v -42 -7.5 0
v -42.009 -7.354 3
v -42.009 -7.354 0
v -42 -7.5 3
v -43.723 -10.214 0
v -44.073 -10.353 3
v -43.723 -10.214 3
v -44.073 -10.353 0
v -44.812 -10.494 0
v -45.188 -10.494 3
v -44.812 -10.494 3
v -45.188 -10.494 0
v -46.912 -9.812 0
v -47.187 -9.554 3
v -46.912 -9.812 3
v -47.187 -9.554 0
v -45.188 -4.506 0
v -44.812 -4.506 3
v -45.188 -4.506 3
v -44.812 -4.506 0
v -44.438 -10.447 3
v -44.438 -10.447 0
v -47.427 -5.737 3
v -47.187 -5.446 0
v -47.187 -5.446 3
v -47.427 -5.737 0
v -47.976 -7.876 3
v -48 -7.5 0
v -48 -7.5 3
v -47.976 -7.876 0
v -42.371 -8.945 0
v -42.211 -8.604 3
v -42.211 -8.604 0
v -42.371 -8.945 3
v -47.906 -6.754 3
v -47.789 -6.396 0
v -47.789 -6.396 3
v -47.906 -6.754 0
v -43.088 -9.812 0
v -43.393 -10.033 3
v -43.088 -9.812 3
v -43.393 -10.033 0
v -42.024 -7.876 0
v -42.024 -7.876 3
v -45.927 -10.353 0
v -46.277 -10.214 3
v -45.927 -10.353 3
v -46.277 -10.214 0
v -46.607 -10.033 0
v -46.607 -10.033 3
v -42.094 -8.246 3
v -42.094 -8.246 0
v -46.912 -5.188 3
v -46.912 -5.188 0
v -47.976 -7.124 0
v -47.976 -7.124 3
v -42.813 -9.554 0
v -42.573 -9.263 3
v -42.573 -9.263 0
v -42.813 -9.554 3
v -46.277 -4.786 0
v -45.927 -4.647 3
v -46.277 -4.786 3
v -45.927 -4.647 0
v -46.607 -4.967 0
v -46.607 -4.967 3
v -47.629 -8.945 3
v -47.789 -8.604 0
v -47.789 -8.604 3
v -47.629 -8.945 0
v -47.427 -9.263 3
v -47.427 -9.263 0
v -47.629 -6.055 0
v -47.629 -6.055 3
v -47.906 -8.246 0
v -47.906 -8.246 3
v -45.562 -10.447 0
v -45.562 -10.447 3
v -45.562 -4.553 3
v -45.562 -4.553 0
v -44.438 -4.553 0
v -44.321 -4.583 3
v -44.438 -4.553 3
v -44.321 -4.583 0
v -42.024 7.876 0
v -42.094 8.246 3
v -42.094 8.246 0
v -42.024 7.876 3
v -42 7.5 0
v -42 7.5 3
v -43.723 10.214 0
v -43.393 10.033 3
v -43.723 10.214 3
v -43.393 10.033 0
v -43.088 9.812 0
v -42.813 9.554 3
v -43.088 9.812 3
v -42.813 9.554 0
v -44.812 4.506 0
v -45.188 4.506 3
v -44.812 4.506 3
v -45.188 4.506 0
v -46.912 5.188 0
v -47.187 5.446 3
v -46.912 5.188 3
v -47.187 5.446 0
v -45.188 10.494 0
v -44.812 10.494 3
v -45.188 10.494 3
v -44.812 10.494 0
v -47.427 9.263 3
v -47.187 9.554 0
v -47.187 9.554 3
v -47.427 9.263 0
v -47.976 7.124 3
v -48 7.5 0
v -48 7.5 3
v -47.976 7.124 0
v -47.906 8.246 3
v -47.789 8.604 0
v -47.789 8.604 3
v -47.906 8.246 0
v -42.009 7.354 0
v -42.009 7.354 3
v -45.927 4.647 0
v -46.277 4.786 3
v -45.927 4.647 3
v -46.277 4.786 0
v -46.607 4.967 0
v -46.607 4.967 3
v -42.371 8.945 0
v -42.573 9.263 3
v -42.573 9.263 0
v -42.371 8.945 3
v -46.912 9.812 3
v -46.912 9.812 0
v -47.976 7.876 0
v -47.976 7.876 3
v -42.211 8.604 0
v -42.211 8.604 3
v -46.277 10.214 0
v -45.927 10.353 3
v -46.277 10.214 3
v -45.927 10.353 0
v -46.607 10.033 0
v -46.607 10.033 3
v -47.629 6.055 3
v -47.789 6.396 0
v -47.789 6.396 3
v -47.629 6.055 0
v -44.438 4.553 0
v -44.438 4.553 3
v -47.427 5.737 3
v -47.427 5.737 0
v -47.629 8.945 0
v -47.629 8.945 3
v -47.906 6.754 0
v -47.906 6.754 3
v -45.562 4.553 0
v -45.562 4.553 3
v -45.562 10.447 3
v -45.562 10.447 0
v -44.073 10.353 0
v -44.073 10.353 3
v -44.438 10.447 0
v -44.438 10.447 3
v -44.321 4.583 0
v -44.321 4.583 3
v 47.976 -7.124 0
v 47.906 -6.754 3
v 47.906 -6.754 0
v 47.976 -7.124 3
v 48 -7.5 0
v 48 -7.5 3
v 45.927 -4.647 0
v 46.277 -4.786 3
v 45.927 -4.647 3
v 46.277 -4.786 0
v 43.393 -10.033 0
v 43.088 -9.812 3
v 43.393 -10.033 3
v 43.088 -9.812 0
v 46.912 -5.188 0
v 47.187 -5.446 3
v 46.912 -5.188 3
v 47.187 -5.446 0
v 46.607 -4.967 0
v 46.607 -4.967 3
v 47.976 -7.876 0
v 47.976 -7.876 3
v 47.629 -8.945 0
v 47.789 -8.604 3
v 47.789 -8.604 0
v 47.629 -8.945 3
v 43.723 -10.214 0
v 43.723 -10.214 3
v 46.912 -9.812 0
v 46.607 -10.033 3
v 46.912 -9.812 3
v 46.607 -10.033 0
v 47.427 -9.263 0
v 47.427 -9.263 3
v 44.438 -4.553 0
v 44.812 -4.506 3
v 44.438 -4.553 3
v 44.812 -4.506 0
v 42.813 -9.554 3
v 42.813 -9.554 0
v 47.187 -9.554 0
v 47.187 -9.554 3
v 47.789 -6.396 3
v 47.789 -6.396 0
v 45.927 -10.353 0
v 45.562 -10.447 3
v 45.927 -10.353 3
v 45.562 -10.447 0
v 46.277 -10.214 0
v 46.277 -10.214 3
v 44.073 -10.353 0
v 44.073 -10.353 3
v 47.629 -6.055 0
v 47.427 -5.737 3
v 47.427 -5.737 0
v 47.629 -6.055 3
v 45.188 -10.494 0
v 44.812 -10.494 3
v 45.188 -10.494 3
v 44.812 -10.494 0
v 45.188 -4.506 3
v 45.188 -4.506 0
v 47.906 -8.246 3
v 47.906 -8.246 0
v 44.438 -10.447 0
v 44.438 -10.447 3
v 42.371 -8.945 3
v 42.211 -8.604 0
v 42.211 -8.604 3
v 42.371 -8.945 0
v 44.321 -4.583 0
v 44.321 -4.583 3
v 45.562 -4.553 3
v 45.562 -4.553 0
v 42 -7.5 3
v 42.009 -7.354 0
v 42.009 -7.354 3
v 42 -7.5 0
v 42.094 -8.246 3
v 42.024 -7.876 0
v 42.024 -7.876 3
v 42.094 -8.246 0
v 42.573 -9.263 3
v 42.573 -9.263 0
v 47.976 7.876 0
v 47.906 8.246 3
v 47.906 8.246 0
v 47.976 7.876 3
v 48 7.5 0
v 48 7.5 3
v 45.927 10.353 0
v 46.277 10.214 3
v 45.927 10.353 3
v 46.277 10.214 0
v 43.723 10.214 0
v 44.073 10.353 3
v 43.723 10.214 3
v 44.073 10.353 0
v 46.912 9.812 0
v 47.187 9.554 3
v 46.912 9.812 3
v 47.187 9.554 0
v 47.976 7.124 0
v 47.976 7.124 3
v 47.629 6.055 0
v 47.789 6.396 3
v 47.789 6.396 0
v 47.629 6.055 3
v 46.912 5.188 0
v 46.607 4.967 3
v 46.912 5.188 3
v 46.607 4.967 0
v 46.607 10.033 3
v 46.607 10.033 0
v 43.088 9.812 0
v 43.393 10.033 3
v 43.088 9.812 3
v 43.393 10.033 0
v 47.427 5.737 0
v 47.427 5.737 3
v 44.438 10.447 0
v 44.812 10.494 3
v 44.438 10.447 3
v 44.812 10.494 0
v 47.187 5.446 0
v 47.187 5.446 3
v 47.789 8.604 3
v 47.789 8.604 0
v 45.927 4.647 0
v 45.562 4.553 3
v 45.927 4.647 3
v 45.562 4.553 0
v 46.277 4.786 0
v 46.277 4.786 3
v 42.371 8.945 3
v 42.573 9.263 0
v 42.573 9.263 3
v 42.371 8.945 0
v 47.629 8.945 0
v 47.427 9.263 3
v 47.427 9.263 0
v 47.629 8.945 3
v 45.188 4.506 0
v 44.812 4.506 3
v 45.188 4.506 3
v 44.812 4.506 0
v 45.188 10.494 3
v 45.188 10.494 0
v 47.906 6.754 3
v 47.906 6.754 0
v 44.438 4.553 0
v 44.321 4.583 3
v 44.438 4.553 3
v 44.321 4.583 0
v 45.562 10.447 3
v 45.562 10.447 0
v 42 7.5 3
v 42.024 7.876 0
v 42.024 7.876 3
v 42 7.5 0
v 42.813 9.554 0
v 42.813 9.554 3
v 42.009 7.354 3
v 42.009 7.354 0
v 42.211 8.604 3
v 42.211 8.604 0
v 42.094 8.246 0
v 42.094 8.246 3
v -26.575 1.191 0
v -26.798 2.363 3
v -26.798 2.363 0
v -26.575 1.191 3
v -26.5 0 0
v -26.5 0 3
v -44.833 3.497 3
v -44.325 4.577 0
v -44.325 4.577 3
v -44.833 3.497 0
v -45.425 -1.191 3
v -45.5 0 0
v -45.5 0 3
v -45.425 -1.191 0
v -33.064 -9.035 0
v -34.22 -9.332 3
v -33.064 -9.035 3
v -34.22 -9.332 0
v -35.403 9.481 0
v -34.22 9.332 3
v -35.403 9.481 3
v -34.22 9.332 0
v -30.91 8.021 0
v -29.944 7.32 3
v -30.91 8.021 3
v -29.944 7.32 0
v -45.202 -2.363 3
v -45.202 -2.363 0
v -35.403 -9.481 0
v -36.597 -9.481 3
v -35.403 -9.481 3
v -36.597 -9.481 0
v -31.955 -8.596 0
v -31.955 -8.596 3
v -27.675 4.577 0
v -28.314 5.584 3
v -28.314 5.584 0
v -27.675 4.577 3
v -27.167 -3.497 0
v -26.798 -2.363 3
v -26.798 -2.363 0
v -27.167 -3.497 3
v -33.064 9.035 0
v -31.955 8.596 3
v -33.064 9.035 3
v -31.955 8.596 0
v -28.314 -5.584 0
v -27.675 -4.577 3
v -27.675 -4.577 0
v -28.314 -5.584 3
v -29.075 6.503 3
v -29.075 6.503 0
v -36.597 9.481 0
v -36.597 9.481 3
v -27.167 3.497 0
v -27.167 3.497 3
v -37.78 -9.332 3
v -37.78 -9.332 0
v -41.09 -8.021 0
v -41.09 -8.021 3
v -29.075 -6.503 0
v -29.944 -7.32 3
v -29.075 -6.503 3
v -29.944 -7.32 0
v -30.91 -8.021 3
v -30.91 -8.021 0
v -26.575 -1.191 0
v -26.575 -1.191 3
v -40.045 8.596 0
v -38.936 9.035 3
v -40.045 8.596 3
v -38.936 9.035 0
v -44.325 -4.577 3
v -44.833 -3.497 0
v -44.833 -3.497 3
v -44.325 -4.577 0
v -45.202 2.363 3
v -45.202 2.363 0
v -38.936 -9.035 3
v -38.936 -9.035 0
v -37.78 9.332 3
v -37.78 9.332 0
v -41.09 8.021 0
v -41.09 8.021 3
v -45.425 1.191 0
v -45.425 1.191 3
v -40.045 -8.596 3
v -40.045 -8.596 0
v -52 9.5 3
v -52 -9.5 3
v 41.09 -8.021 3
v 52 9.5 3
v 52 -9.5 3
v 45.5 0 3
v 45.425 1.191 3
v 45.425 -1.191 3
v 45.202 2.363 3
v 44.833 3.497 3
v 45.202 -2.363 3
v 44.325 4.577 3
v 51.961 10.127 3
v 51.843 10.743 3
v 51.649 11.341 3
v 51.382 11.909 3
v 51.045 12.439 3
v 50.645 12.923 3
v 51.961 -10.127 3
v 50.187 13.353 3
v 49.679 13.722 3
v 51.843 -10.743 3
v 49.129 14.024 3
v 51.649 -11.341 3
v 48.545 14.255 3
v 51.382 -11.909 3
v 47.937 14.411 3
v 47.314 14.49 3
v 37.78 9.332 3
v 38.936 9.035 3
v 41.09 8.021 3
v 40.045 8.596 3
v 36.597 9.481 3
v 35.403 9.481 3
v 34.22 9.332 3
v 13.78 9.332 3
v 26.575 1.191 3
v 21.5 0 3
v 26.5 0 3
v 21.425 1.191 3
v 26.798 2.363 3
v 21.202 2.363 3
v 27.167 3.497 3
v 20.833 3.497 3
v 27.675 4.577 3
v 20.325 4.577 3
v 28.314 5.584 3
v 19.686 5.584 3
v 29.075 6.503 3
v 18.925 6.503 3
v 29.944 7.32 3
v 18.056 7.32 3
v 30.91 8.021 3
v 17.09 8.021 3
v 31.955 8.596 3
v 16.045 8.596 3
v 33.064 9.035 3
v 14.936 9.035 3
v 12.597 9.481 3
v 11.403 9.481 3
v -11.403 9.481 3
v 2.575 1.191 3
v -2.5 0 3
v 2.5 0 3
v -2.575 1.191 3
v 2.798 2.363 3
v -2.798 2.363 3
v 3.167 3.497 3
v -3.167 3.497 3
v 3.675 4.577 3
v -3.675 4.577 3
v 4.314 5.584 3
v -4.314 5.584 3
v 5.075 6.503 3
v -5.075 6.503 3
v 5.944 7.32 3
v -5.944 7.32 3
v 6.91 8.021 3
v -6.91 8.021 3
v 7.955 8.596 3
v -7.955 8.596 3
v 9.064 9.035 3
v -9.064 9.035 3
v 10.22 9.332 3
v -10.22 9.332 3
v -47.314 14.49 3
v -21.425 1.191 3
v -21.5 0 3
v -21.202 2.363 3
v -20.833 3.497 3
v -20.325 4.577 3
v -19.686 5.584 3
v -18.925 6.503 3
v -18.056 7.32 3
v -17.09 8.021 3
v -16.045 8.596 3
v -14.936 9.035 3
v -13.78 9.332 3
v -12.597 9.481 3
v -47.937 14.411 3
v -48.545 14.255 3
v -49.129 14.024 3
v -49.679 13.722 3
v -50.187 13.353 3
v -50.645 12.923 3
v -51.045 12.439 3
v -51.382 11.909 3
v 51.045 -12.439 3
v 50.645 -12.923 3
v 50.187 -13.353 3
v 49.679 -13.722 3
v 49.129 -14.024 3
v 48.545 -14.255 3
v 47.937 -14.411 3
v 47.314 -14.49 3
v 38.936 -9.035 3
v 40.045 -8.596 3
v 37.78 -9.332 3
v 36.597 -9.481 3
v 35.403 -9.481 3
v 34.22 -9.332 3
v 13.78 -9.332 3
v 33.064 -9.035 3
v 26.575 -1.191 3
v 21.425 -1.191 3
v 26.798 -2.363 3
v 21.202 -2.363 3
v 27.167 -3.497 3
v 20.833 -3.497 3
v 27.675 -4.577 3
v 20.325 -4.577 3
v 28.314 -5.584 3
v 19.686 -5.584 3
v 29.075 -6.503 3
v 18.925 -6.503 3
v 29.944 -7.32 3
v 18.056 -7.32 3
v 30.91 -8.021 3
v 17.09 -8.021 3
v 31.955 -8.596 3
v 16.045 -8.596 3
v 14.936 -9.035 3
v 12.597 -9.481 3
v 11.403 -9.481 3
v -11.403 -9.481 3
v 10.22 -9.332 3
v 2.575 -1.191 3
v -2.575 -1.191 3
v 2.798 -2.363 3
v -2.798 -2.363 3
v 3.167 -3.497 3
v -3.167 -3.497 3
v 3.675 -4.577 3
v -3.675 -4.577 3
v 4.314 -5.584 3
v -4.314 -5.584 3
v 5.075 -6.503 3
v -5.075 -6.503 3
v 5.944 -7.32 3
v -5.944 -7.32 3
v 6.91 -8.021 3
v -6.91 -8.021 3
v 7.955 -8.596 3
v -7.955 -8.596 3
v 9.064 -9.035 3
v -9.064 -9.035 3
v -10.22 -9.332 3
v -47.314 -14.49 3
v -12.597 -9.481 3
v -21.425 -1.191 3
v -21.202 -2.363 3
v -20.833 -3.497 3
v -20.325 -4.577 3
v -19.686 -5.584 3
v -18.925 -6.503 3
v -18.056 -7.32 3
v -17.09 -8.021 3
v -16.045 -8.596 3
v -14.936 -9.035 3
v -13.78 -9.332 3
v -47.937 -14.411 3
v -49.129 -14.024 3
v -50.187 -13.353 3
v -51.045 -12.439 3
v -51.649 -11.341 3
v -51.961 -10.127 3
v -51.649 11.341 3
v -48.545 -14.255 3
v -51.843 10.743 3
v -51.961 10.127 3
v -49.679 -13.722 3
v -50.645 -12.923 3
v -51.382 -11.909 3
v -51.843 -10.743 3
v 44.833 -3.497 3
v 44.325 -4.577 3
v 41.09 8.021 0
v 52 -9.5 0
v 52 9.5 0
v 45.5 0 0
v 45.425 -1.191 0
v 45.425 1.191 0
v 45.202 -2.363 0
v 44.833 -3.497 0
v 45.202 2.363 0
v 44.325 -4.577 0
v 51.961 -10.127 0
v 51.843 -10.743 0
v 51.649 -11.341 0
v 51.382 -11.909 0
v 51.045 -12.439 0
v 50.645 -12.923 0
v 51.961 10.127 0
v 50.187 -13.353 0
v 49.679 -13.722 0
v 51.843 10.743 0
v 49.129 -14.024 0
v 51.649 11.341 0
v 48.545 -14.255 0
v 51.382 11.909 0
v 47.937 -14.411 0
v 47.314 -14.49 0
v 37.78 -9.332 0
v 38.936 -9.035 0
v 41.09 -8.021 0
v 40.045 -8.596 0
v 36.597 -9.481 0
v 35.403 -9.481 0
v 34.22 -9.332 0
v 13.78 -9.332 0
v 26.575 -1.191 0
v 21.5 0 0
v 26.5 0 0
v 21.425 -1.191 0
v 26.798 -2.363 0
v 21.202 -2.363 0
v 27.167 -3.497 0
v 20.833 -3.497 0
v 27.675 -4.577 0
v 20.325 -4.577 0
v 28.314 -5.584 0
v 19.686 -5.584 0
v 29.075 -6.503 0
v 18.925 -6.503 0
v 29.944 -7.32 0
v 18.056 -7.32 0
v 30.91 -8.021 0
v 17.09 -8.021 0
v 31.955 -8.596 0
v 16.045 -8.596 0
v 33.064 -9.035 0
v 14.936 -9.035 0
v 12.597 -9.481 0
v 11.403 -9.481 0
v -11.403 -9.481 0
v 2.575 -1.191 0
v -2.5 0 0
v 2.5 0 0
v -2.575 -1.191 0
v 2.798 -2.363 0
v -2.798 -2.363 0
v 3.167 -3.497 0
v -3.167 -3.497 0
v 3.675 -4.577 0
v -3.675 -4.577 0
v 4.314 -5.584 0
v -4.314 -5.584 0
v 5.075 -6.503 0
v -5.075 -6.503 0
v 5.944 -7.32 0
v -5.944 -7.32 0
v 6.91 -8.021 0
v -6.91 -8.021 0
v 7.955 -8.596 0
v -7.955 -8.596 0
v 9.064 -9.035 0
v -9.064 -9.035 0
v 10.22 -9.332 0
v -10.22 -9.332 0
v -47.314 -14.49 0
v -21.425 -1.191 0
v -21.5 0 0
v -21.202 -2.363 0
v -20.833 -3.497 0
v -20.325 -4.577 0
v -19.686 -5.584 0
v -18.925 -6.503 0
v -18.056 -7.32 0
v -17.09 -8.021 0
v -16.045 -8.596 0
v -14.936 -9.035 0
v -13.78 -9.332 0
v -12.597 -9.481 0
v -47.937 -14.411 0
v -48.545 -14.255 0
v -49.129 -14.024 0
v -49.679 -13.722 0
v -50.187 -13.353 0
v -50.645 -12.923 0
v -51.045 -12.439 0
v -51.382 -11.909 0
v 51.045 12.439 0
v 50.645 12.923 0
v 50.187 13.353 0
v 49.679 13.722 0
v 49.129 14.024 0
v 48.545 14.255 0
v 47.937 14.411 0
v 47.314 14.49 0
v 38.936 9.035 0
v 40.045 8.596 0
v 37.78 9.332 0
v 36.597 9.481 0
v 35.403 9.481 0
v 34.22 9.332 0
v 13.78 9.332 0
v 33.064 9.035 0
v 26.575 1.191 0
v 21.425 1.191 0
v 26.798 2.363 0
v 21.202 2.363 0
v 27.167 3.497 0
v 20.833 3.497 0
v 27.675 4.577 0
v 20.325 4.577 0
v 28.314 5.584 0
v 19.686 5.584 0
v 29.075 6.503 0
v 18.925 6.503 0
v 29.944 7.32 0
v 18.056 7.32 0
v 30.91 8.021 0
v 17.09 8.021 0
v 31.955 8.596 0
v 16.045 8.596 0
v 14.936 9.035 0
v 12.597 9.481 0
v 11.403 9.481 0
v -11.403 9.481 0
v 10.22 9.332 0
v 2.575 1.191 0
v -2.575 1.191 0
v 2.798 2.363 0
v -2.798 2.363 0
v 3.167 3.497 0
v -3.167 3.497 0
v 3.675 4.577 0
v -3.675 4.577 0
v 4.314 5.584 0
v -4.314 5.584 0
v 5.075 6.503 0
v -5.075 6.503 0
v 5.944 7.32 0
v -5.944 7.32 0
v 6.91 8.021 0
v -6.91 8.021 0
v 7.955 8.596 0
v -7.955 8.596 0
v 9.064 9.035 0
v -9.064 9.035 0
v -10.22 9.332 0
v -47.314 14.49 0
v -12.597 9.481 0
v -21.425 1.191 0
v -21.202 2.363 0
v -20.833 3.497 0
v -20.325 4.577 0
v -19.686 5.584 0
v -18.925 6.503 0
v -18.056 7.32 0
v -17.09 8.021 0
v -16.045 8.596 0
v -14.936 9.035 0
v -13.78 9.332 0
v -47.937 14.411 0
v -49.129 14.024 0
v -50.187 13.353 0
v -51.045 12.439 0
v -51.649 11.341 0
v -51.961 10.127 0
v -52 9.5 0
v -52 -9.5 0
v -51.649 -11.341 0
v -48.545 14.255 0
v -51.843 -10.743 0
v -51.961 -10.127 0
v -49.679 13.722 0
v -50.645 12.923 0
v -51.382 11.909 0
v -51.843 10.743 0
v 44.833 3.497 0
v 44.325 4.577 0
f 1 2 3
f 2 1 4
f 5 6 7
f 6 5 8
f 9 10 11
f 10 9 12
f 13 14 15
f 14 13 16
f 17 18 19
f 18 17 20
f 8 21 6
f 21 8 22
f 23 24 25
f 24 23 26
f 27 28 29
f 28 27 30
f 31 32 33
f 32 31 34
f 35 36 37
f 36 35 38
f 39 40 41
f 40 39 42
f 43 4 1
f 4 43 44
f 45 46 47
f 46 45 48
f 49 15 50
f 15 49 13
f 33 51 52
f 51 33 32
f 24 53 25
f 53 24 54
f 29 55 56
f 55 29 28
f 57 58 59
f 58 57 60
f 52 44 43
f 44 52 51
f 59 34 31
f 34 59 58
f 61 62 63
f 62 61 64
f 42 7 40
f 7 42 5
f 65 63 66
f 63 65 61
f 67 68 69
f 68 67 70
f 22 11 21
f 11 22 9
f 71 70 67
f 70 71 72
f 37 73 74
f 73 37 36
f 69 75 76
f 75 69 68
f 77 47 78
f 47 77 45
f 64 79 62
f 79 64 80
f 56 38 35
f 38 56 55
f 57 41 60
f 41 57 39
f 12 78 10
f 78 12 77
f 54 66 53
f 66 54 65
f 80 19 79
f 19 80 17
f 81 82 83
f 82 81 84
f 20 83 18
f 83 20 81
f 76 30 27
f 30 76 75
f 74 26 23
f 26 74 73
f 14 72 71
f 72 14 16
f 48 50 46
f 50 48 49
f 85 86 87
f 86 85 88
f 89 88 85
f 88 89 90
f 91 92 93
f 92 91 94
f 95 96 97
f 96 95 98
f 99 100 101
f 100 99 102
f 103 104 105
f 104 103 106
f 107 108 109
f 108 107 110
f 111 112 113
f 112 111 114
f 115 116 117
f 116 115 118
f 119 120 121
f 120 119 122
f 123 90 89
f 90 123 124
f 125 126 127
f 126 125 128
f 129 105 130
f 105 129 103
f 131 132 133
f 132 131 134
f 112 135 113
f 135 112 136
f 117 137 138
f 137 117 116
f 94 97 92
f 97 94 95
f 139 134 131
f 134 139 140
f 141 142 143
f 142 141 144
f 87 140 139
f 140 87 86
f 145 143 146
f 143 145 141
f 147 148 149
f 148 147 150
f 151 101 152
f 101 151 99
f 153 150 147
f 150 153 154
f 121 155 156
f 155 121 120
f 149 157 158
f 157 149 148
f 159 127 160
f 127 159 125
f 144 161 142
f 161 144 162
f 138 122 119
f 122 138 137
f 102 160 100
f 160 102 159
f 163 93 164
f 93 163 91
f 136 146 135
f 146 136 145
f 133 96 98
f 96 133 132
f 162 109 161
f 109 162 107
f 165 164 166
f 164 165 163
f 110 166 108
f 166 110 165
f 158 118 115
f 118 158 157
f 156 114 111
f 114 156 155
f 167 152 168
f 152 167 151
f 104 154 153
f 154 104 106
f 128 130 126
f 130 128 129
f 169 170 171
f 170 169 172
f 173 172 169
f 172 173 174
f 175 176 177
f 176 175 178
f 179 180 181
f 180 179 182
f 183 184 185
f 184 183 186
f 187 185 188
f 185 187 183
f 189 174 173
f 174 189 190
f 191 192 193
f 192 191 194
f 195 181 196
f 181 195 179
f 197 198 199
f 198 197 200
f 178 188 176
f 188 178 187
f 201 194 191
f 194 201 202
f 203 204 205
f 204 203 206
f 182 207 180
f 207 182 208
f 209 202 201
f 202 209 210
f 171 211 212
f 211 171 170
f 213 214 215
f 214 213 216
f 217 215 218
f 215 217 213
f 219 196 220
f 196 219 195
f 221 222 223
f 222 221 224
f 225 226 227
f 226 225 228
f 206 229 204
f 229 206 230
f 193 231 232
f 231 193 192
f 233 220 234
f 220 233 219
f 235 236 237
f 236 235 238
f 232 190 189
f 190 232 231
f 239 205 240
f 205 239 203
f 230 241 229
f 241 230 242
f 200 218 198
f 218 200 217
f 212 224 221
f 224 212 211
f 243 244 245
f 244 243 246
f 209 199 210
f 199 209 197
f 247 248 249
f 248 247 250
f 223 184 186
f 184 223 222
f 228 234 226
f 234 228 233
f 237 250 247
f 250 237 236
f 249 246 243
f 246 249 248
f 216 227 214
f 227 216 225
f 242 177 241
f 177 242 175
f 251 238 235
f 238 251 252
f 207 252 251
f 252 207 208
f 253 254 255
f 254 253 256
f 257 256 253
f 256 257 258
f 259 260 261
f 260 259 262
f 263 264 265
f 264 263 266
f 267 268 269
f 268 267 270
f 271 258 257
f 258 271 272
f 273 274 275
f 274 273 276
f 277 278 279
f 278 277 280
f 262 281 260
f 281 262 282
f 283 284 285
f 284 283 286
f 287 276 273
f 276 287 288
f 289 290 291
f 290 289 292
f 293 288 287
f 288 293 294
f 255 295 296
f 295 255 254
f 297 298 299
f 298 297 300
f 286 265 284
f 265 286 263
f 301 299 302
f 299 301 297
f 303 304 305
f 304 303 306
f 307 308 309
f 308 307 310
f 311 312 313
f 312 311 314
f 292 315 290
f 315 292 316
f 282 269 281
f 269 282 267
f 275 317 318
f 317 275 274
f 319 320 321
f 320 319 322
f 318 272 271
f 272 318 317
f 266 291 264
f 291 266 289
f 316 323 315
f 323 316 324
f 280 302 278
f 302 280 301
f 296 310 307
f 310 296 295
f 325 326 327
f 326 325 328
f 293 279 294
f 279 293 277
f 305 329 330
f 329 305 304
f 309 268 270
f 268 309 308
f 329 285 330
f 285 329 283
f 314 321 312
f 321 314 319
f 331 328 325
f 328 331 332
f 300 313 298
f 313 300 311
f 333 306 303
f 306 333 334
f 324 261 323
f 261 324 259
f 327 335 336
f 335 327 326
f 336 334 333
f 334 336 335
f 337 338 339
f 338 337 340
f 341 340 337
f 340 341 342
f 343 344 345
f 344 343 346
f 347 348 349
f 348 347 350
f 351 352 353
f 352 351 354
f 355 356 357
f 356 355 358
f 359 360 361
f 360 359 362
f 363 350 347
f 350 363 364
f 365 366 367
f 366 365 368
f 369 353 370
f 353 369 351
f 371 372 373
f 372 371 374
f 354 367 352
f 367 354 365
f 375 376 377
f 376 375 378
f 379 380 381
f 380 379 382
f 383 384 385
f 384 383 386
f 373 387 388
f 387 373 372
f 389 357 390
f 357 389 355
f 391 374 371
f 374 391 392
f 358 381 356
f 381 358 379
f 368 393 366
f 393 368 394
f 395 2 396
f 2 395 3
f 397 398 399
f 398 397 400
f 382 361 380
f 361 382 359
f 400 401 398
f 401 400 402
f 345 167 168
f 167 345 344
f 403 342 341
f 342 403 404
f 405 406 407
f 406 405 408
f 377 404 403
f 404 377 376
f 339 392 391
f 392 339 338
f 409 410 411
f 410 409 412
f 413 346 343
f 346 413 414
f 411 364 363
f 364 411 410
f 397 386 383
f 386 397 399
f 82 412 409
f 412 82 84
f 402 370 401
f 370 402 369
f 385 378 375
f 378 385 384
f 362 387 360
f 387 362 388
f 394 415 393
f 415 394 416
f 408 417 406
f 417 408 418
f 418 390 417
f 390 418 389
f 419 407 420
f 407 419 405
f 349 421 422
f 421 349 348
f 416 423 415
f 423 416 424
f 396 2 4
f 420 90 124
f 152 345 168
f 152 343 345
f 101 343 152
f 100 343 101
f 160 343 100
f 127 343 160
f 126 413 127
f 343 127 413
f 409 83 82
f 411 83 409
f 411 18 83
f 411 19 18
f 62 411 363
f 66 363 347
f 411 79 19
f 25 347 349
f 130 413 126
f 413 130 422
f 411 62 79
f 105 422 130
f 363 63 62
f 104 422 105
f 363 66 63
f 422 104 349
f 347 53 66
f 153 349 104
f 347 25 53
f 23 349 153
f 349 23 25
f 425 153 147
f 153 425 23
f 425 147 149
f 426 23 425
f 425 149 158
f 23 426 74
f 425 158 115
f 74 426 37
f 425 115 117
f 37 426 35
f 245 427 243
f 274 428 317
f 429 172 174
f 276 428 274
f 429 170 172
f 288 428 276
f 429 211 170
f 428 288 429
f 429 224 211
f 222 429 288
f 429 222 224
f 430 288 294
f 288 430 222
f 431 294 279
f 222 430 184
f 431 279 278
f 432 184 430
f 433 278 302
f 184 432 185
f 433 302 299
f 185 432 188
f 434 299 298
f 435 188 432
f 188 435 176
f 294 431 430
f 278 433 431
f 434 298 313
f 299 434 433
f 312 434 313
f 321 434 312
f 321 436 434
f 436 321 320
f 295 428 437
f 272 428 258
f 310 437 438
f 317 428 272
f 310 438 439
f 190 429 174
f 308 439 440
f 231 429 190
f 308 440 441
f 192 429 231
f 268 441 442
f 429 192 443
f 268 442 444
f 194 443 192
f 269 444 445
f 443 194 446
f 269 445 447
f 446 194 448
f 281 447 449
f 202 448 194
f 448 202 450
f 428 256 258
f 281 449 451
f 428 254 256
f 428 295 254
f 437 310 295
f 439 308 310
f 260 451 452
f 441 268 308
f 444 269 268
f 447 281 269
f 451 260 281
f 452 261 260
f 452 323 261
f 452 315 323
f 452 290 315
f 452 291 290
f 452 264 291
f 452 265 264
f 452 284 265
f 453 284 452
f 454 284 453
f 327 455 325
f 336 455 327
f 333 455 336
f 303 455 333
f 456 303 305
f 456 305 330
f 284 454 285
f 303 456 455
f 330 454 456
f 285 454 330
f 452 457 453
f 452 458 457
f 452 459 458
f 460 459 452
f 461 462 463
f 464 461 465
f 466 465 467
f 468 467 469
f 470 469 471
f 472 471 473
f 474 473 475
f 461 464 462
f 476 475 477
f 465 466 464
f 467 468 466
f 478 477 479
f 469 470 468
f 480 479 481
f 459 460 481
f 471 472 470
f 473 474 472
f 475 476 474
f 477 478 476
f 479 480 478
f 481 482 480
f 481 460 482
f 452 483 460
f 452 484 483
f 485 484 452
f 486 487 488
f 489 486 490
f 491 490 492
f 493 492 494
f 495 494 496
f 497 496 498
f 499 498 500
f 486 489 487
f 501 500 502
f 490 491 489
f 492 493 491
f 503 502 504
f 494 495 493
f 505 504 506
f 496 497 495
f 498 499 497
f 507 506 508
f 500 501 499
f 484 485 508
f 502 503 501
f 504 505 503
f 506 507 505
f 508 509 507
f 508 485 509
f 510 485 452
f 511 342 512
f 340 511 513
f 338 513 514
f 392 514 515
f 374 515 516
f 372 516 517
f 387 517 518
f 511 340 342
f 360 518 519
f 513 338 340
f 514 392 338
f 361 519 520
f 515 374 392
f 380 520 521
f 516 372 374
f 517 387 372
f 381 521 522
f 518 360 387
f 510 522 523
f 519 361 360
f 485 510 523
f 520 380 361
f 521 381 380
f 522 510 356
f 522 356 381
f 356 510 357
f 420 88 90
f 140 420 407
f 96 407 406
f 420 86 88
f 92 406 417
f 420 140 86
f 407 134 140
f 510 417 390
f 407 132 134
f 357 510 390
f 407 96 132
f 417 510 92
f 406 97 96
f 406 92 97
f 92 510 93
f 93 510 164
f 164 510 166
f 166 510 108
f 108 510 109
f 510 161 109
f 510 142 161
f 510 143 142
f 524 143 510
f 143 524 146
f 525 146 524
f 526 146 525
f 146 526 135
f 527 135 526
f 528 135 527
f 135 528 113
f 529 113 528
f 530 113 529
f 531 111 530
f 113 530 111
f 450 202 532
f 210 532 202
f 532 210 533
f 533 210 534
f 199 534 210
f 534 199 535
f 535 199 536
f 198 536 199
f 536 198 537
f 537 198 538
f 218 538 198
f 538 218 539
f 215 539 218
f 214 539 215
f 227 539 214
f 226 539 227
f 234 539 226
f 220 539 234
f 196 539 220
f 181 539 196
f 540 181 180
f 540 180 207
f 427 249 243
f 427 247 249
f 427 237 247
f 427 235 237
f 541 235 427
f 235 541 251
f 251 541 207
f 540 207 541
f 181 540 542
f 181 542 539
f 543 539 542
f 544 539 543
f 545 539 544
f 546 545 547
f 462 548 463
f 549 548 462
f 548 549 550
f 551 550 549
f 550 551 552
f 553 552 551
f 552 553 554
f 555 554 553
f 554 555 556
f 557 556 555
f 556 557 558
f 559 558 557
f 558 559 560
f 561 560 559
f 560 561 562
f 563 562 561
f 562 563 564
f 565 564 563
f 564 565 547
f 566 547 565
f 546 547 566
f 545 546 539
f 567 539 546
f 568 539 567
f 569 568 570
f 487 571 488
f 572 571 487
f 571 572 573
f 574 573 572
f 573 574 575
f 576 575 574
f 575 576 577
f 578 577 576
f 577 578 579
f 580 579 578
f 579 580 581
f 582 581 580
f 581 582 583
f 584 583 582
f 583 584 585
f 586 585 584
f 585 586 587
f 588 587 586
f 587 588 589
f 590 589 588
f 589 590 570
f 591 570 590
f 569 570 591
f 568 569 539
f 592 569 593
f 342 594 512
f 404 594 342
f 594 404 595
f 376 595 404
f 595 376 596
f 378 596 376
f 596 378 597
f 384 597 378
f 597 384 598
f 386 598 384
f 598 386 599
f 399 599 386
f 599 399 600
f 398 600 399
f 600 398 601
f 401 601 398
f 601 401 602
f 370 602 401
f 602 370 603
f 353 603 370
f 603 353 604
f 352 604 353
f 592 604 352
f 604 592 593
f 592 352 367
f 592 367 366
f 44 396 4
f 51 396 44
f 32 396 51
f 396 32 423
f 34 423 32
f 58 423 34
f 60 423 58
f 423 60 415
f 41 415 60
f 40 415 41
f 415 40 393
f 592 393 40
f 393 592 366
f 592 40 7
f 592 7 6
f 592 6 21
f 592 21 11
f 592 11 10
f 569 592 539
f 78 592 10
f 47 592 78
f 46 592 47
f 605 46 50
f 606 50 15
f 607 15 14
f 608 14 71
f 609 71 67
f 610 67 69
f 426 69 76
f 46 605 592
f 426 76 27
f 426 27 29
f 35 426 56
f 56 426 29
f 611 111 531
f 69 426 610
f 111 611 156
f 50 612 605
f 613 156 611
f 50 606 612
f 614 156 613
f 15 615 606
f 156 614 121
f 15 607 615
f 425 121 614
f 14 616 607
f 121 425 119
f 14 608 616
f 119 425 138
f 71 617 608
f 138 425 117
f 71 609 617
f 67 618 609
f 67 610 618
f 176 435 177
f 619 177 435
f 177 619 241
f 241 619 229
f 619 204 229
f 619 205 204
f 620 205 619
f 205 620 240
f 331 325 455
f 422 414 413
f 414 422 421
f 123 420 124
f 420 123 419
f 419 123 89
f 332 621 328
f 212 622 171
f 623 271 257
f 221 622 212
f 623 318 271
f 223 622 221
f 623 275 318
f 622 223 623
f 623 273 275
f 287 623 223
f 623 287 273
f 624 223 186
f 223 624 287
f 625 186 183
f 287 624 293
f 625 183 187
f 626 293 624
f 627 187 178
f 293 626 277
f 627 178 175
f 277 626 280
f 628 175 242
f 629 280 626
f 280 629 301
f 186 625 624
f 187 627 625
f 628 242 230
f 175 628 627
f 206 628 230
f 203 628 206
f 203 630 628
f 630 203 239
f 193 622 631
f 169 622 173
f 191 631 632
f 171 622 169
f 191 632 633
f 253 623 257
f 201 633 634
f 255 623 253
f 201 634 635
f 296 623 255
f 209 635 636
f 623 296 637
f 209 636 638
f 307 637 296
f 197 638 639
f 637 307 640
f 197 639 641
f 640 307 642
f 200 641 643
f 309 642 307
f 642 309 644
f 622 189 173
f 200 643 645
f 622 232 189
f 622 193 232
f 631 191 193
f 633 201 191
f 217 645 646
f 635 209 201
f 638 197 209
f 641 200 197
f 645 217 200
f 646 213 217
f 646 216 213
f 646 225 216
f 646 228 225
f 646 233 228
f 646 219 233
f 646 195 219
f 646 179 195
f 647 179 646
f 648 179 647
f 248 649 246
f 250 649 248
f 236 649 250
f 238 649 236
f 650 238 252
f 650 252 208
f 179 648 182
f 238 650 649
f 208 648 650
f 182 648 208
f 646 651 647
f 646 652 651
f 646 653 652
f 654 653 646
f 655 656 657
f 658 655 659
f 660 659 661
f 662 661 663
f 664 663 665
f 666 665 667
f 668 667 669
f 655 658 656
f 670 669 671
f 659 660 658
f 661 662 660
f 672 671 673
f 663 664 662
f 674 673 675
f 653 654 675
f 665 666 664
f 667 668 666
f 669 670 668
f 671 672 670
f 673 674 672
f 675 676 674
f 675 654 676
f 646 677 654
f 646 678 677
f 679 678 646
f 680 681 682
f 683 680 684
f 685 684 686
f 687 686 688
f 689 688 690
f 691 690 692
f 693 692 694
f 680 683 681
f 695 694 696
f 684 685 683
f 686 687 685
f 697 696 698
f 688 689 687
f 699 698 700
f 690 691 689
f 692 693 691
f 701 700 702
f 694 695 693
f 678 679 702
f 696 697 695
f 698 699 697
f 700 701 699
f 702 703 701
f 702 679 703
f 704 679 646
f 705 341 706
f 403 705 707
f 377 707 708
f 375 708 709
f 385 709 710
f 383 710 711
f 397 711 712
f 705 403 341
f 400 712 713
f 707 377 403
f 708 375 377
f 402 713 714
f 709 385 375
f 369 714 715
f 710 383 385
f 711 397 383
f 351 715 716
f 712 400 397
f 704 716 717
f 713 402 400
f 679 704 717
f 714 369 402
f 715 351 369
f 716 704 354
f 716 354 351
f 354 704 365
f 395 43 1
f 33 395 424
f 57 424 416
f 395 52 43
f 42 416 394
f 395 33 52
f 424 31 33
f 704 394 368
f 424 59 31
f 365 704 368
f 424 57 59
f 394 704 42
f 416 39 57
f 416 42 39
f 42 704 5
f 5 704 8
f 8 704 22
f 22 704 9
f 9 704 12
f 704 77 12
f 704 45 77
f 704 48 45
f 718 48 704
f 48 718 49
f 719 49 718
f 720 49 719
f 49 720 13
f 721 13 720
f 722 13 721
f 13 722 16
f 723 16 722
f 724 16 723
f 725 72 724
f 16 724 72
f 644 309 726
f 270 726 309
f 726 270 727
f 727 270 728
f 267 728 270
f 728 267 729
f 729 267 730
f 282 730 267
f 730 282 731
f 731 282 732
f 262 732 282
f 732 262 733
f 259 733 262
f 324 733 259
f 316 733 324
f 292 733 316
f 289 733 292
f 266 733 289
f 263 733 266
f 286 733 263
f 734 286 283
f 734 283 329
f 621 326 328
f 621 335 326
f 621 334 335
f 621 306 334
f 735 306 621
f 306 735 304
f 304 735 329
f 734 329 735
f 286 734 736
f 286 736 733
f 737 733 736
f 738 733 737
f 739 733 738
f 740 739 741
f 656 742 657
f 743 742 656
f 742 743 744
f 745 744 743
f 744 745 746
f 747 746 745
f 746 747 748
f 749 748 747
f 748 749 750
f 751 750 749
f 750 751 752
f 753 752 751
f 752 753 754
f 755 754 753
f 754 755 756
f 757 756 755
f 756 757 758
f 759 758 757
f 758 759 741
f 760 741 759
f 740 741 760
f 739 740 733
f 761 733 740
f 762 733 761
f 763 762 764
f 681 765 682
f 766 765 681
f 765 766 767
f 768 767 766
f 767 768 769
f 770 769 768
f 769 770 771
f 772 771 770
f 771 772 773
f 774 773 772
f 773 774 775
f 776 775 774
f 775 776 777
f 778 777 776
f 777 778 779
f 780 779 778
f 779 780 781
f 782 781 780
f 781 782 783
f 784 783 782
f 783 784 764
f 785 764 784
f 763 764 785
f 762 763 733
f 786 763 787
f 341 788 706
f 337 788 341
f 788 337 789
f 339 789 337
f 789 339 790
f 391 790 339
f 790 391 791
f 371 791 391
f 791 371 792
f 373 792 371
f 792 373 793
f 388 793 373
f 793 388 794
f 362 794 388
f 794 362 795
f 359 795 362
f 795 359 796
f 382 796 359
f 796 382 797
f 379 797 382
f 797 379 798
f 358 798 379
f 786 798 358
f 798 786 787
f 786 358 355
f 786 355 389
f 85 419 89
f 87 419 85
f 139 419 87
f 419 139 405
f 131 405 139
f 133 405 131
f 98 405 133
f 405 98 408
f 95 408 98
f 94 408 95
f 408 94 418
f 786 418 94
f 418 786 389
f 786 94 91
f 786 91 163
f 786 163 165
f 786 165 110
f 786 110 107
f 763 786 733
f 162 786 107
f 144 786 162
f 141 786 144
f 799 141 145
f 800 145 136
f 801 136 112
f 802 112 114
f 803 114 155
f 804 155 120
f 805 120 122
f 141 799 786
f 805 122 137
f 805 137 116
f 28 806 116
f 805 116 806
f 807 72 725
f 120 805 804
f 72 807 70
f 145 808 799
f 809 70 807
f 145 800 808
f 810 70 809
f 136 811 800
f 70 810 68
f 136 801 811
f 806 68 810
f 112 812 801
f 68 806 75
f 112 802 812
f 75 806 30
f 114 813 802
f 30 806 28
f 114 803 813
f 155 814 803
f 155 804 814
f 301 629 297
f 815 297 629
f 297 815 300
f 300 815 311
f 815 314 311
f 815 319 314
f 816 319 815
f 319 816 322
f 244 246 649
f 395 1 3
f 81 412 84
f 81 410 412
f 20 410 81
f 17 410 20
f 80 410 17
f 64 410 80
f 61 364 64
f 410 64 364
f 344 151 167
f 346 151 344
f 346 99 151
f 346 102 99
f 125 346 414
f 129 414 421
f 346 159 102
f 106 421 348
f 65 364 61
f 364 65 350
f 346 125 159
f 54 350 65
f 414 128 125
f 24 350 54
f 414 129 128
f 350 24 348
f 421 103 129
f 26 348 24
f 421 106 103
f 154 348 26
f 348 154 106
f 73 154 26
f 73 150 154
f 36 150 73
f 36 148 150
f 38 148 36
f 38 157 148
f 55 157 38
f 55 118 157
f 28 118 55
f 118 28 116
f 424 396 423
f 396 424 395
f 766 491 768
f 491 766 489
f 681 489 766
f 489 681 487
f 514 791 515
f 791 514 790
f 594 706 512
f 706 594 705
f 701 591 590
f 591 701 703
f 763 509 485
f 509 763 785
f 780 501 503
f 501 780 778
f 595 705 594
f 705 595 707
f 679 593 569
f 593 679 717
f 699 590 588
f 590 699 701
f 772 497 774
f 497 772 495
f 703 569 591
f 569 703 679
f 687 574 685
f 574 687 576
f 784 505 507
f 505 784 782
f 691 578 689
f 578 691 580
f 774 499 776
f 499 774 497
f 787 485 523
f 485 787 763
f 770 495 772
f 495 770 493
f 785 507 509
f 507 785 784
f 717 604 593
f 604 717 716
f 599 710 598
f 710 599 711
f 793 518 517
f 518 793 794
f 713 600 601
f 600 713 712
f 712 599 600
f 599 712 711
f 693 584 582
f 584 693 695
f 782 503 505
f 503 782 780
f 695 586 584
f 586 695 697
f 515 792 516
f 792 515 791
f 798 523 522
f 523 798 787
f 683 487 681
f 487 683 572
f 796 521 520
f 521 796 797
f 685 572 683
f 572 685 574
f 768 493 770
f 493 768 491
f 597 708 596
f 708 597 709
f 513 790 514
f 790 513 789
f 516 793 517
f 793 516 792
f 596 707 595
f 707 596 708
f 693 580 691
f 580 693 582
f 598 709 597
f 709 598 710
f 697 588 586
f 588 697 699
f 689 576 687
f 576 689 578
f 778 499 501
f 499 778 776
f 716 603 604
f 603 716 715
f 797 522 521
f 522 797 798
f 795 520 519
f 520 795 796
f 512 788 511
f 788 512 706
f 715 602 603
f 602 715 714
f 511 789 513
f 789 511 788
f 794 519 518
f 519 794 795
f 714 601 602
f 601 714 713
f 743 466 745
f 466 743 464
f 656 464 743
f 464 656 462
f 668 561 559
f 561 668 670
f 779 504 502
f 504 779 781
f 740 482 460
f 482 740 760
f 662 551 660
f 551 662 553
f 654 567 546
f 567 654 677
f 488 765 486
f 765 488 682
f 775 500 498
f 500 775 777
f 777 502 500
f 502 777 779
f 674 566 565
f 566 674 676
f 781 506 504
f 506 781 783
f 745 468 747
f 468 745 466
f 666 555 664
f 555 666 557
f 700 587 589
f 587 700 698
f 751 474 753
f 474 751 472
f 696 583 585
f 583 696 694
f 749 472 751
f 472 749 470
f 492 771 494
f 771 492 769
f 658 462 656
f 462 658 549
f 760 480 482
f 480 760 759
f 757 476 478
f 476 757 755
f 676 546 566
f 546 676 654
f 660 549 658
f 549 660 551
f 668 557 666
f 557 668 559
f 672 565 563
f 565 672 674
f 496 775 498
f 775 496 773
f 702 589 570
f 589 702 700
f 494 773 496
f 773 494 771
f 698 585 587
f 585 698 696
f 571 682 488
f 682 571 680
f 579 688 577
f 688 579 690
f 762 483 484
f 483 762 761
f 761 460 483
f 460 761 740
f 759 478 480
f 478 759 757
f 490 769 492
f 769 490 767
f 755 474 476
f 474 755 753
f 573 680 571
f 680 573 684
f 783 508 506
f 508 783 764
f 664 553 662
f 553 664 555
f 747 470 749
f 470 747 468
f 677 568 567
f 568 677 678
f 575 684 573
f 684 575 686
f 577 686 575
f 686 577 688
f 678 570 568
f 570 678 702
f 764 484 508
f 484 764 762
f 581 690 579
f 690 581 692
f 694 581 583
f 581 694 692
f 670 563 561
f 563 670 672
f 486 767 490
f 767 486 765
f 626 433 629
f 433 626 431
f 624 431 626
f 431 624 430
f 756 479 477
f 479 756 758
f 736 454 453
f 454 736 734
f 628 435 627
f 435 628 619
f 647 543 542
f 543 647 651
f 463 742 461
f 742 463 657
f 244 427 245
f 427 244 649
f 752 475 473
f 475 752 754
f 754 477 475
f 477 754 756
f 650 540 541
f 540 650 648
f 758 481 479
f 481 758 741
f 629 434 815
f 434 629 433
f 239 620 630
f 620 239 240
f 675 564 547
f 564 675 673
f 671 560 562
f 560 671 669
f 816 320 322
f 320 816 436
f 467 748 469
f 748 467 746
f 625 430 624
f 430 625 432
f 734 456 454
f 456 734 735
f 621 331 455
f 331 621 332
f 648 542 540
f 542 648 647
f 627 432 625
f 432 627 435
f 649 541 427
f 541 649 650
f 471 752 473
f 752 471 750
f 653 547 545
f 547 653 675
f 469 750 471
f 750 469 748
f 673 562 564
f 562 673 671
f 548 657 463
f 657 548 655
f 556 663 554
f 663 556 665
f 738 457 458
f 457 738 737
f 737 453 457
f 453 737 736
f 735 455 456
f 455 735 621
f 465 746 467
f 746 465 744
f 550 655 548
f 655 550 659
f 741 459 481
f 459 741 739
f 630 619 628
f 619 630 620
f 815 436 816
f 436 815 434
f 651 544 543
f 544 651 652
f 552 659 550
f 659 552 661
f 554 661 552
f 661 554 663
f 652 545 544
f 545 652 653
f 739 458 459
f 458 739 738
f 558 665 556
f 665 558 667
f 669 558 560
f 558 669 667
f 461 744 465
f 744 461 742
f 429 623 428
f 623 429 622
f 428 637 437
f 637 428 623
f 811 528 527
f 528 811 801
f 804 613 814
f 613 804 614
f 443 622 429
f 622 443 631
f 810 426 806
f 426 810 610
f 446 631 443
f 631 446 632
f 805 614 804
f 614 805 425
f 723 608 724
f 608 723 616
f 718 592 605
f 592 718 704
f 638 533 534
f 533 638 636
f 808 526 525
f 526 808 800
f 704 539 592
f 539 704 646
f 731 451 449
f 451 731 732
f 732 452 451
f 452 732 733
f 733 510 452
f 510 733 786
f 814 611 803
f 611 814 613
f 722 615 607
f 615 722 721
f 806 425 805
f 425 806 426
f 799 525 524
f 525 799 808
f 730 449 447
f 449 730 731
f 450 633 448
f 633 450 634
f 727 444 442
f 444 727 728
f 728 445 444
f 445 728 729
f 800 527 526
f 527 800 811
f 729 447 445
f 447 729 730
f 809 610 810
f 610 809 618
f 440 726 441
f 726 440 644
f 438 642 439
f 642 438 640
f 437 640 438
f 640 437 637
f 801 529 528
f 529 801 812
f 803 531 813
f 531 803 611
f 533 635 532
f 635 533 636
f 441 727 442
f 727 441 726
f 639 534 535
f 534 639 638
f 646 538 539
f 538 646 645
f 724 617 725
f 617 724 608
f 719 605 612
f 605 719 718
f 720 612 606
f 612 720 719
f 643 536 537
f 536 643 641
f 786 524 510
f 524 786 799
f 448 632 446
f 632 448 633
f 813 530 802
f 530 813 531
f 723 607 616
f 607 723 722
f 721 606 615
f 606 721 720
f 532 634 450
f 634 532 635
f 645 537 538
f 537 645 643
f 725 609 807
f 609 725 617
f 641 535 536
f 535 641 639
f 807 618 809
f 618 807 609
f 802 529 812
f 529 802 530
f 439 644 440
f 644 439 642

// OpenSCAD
$fn = 50;


difference() {
	union() {
		hull() {
			translate(v = [-47.0000000000, 9.5000000000, 0]) {
				cylinder(h = 3, r = 5);
			}
			translate(v = [47.0000000000, 9.5000000000, 0]) {
				cylinder(h = 3, r = 5);
			}
			translate(v = [-47.0000000000, -9.5000000000, 0]) {
				cylinder(h = 3, r = 5);
			}
			translate(v = [47.0000000000, -9.5000000000, 0]) {
				cylinder(h = 3, r = 5);
			}
		}
	}
	union() {
		#translate(v = [-45.0000000000, -7.5000000000, -100.0000000000]) {
			cylinder(h = 200, r = 3.0000000000);
		}
		#translate(v = [-45.0000000000, 7.5000000000, -100.0000000000]) {
			cylinder(h = 200, r = 3.0000000000);
		}
		#translate(v = [45.0000000000, -7.5000000000, -100.0000000000]) {
			cylinder(h = 200, r = 3.0000000000);
		}
		#translate(v = [45.0000000000, 7.5000000000, -100.0000000000]) {
			cylinder(h = 200, r = 3.0000000000);
		}
		#translate(v = [-36.0000000000, 0, 0]) {
			cylinder(h = 3, r = 9.5000000000);
		}
		#translate(v = [-12.0000000000, 0, 0]) {
			cylinder(h = 3, r = 9.5000000000);
		}
		#translate(v = [12.0000000000, 0, 0]) {
			cylinder(h = 3, r = 9.5000000000);
		}
		#translate(v = [36.0000000000, 0, 0]) {
			cylinder(h = 3, r = 9.5000000000);
		}
	}
}
